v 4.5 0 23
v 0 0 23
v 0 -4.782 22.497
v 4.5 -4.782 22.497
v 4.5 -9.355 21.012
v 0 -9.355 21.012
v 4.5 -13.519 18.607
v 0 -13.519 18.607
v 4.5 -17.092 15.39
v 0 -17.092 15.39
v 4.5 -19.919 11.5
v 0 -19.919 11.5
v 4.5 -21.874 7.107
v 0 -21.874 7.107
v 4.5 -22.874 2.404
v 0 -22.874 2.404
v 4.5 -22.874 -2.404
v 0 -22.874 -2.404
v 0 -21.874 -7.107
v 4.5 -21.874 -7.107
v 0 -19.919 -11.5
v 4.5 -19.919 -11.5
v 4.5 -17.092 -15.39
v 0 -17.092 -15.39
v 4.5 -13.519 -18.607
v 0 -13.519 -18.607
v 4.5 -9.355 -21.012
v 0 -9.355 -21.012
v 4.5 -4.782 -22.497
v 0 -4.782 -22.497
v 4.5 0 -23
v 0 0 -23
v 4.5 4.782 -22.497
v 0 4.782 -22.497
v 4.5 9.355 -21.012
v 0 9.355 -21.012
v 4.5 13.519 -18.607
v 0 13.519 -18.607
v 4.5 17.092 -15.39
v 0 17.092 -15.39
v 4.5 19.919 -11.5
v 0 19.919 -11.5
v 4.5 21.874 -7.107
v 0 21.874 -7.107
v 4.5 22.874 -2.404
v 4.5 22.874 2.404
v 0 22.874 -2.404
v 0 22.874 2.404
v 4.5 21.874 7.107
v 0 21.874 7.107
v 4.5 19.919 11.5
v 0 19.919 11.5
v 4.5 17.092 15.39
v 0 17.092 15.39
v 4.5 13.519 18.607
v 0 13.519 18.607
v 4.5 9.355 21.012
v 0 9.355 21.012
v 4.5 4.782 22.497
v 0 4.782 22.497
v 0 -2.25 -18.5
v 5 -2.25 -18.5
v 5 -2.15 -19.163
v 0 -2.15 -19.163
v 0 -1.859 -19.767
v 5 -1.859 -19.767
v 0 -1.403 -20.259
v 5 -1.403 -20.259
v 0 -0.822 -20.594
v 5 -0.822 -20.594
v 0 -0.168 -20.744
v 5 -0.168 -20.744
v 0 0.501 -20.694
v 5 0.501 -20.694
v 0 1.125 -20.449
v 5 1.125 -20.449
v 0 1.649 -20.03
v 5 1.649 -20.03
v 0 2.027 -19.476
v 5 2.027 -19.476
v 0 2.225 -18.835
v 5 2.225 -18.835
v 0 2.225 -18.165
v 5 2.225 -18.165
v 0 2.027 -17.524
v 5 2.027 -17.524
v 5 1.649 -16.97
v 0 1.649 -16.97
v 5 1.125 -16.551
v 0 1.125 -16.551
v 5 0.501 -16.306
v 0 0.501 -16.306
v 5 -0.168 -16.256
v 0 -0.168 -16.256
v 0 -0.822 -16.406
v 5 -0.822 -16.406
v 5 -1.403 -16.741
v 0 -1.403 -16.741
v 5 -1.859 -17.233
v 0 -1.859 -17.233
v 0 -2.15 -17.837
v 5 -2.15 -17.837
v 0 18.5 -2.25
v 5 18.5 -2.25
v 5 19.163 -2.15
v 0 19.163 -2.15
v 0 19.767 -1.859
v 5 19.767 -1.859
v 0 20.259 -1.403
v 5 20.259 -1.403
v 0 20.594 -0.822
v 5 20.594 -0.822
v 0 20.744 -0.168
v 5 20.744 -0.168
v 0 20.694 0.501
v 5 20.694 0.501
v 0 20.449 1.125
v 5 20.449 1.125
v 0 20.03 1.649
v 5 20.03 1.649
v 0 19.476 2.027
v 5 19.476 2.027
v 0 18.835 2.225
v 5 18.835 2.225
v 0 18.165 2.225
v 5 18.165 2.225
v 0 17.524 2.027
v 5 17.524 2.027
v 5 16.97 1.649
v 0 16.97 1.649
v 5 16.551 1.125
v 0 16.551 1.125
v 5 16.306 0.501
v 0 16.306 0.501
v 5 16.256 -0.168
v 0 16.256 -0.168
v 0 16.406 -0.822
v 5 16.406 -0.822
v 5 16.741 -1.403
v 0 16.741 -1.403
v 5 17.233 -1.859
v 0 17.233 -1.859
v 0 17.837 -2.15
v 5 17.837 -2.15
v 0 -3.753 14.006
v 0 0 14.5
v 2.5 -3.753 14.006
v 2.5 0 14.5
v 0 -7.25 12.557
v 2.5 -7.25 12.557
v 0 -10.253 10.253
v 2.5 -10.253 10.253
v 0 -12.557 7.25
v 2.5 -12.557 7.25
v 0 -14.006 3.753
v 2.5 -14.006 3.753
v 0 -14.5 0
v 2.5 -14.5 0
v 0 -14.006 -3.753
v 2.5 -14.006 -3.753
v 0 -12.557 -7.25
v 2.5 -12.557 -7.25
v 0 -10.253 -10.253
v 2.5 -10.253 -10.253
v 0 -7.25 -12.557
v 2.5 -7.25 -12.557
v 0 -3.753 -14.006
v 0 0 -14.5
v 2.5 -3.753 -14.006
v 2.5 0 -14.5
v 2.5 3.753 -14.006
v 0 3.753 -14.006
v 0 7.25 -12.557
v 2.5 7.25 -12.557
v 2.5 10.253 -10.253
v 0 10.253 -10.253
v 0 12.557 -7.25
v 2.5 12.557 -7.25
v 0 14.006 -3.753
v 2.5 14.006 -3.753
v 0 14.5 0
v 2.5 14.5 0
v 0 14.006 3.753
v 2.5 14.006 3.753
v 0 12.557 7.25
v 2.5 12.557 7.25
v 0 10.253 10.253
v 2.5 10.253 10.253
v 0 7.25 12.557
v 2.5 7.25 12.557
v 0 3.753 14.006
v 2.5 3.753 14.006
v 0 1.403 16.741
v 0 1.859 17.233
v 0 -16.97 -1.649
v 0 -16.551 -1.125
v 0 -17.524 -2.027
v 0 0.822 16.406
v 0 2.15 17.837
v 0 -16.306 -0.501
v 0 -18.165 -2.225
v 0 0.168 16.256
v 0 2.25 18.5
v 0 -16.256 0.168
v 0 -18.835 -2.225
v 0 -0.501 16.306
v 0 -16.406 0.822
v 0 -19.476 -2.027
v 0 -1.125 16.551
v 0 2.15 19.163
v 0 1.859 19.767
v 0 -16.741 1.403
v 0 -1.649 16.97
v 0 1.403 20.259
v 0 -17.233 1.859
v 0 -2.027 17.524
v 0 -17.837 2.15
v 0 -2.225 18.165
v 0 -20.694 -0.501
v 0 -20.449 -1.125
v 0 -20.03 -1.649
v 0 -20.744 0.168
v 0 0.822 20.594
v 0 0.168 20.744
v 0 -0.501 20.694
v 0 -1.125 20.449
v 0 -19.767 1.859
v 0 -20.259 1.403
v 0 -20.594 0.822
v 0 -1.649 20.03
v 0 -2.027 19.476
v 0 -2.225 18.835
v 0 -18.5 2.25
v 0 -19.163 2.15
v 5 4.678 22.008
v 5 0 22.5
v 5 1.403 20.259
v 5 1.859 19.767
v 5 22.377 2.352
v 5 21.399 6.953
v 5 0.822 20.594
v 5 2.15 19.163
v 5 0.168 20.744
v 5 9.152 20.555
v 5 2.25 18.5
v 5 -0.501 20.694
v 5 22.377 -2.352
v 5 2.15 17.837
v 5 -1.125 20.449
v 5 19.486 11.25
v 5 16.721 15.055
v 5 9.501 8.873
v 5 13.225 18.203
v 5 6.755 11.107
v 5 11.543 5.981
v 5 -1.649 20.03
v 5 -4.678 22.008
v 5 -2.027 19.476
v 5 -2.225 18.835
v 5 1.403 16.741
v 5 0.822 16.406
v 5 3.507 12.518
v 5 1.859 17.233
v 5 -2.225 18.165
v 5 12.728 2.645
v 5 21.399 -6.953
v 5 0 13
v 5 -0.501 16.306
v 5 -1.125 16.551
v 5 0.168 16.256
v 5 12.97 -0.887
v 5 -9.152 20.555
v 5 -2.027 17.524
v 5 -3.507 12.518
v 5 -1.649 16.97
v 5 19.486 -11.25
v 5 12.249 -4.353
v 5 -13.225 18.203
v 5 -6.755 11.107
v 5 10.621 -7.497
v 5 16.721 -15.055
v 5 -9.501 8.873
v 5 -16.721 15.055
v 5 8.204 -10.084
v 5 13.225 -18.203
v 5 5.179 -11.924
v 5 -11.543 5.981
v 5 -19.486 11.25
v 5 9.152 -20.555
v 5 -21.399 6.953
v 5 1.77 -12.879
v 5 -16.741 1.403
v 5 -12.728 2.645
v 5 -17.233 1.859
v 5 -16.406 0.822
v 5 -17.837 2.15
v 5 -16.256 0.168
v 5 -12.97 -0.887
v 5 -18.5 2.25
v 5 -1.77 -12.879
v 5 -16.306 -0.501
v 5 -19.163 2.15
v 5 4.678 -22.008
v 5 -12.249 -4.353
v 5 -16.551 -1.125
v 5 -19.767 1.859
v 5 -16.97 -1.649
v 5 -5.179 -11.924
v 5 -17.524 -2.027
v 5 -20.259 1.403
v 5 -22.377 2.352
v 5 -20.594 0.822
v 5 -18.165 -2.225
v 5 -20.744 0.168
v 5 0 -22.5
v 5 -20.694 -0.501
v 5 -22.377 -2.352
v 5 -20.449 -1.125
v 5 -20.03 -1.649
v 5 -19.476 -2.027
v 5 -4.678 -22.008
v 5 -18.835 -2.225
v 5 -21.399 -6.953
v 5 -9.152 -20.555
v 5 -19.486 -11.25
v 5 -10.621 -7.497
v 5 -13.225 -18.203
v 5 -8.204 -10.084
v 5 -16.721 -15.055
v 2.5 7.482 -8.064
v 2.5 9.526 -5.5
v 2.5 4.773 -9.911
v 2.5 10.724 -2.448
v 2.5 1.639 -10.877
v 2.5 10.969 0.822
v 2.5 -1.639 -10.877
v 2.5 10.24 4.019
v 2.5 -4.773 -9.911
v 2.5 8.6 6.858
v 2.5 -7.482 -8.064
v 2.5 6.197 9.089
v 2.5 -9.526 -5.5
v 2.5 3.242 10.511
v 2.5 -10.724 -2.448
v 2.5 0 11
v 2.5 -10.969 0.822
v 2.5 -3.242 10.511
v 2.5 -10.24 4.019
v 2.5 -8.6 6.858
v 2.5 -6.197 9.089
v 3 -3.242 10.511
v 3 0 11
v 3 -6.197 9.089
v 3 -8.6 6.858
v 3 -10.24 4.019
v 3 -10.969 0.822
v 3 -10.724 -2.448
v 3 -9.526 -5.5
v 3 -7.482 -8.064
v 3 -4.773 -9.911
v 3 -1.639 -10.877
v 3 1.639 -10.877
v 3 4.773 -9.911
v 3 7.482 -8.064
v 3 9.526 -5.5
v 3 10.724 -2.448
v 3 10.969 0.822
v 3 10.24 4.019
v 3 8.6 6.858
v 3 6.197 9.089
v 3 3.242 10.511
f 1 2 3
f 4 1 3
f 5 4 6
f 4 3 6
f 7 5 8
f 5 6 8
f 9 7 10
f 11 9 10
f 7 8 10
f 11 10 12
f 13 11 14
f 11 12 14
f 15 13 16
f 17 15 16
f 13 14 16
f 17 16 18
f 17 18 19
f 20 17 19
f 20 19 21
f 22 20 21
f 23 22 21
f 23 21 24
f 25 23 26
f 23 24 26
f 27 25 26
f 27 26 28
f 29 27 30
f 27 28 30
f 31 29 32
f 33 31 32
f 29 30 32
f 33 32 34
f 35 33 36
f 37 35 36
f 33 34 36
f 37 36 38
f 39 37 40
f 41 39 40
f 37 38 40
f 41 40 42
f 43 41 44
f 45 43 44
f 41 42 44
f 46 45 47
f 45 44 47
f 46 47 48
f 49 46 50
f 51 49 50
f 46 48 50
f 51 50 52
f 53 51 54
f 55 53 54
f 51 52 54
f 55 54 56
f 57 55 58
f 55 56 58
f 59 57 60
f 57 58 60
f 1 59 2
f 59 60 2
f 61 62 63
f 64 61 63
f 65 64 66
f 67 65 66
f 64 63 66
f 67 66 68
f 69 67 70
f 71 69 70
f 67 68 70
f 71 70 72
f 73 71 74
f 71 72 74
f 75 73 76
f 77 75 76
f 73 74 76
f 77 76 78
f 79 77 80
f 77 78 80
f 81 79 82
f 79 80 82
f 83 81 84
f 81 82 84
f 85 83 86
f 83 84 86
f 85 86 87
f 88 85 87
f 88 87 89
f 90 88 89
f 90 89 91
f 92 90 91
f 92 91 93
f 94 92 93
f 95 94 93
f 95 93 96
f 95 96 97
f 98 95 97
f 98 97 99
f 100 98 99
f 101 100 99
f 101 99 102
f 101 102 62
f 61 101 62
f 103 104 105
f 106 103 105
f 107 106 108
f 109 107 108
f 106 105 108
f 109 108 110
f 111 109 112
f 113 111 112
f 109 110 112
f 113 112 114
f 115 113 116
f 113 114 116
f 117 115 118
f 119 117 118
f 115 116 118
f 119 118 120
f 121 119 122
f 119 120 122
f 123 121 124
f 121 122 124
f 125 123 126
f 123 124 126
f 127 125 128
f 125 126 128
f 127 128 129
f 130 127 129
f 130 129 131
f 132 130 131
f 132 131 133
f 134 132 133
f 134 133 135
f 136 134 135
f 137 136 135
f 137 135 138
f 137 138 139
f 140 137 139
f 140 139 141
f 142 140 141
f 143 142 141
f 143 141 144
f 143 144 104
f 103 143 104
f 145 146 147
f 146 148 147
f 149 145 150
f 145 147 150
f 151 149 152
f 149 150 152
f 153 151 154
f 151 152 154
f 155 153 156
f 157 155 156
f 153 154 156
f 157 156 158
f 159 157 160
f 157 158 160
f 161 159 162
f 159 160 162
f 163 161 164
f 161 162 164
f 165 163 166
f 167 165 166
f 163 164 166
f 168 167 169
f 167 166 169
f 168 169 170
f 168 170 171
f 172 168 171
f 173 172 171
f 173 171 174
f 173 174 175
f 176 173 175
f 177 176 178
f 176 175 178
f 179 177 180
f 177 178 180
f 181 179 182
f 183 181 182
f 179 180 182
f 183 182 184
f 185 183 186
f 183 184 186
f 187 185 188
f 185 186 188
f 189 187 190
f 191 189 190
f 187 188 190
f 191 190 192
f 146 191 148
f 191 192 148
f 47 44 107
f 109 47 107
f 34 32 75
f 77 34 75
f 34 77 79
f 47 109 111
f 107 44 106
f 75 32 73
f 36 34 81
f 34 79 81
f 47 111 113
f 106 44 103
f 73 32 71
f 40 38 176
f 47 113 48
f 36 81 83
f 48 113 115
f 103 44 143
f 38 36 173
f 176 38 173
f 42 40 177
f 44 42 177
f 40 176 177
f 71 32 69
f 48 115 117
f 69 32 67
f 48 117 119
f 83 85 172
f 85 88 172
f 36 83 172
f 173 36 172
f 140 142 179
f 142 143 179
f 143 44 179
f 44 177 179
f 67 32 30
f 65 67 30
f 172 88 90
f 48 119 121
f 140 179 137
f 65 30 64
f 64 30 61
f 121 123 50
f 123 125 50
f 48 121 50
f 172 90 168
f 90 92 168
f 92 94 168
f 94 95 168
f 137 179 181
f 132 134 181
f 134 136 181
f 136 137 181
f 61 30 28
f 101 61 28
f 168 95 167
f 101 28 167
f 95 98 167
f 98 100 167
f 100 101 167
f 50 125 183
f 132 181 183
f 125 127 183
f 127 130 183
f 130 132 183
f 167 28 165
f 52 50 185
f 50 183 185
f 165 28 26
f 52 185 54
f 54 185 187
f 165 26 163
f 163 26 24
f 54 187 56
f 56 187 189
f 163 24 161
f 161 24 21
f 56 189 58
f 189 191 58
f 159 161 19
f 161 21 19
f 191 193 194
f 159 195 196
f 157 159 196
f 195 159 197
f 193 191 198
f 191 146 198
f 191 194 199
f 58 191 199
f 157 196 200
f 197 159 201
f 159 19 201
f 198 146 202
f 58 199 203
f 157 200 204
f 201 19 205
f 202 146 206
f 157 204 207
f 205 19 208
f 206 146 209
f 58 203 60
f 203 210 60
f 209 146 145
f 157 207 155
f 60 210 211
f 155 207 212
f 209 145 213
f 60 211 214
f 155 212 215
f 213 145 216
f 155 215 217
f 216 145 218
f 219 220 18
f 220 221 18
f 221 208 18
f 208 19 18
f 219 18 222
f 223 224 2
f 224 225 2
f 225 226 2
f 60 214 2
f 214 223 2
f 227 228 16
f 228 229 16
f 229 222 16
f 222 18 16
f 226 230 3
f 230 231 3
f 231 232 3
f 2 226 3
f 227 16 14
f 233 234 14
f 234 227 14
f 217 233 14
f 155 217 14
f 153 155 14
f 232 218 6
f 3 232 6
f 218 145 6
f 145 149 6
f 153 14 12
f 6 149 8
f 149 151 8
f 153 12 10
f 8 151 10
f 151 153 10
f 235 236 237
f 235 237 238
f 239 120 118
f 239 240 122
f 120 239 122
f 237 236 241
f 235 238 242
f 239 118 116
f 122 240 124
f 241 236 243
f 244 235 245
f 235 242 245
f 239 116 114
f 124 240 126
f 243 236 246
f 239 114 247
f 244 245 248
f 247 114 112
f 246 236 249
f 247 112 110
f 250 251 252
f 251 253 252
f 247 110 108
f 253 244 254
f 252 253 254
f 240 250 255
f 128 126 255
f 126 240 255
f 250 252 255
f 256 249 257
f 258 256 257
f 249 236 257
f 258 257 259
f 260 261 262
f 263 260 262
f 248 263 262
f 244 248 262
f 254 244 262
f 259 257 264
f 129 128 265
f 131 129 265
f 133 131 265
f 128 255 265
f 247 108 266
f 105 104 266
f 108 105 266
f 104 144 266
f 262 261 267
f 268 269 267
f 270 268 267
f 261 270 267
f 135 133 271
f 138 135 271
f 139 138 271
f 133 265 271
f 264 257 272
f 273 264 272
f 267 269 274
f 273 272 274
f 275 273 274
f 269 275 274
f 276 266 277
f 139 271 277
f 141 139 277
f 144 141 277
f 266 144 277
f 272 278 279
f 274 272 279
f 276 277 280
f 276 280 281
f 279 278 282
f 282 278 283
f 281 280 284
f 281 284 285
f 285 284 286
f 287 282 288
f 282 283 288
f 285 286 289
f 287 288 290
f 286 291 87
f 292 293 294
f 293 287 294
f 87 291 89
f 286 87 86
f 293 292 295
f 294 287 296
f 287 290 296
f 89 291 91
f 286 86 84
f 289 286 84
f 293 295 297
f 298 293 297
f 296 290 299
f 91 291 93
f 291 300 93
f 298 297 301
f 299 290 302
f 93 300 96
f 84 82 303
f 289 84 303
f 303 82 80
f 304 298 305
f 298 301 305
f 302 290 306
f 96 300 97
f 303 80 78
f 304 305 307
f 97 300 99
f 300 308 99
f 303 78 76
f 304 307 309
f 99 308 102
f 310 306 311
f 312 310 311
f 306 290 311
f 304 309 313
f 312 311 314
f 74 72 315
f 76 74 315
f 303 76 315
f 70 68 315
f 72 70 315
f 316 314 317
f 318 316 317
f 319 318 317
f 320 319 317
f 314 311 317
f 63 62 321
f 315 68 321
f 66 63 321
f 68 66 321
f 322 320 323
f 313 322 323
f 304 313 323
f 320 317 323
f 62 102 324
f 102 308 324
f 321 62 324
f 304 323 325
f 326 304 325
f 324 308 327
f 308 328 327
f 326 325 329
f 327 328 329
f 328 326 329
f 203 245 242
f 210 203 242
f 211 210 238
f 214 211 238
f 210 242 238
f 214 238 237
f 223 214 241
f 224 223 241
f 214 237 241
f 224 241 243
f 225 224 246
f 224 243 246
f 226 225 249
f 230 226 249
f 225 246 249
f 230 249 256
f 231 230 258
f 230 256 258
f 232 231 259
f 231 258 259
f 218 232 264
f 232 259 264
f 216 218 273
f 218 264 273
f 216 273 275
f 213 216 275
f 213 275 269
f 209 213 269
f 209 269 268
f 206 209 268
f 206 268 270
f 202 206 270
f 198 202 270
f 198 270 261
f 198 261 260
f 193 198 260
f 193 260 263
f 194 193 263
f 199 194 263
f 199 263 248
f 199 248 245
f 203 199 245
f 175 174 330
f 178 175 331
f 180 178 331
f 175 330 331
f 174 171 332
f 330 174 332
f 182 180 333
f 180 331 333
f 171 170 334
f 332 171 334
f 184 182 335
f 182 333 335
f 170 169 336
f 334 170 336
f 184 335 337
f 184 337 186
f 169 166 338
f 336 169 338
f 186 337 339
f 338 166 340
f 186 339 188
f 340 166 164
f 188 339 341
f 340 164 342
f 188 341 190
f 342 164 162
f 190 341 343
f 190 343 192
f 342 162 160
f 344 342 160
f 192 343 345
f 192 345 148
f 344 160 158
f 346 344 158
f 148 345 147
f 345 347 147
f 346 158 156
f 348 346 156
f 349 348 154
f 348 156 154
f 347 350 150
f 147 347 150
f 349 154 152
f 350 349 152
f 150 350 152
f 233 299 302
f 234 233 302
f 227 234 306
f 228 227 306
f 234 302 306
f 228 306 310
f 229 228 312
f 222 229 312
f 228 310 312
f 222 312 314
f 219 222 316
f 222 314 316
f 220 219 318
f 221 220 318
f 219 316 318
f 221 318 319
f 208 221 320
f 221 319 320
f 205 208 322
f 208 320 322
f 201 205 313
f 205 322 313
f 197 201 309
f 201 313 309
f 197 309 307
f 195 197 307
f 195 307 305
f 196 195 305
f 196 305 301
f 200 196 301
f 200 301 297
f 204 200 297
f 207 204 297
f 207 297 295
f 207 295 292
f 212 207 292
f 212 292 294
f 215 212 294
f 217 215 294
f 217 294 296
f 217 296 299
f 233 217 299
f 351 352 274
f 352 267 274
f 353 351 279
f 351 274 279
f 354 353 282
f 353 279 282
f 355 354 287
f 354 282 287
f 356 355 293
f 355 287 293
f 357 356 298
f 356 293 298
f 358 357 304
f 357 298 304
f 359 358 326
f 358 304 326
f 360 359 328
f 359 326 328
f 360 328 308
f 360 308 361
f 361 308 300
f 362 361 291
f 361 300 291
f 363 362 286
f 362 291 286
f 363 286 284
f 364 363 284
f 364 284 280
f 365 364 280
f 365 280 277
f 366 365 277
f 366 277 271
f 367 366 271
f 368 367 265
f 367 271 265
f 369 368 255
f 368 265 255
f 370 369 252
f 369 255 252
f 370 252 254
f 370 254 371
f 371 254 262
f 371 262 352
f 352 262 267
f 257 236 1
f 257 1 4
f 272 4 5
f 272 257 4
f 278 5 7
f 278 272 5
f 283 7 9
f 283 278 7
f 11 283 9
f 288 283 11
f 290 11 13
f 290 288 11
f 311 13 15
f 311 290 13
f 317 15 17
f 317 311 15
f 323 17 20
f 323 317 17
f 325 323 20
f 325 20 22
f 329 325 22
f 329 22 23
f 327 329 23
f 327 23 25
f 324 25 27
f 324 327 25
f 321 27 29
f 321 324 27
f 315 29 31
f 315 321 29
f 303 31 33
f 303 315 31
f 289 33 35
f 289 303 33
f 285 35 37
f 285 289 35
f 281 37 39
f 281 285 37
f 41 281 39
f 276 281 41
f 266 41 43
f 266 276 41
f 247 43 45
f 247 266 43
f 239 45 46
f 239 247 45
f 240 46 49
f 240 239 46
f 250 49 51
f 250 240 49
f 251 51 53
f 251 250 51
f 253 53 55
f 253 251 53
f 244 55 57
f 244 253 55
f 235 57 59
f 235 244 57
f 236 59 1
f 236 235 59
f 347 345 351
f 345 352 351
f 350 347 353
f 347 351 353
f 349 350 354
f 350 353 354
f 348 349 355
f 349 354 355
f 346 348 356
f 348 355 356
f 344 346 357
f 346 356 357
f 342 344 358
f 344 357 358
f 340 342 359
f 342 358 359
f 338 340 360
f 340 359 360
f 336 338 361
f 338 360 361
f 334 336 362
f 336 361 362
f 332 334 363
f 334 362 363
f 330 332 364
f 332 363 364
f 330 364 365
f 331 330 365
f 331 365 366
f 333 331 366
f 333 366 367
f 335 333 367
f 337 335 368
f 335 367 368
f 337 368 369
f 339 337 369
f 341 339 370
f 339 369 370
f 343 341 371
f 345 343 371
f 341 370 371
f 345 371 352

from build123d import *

# Parameters (mm, degrees)
SKETCH_2_R               = 2.25
CUT_EXTRUDE_1_DEPTH      = 33.908965344
PATTERN_CIRCULAR_1_COUNT = 4
CHAMFER_1_SIZE           = 0.5


with BuildPart() as part:
    # Эскиз1 → Повернуть1 (revolve)
    with BuildSketch(Plane.XY, mode=Mode.PRIVATE) as revolve_1_sk:
        Polygon((0, 23), (0, 14.5), (2.5, 14.5), (2.5, 11), (3, 11), (5, 13), (5, 23), align=None)
    revolve(revolve_1_sk.sketch.rotate(Axis((0, 0, 0), (1, 0, 0)), 90), axis=Axis((0, 0, 0), (1, 0, 0)))

    # Эскиз2 → Вырез-Вытянуть1 (cut, through all)
    with BuildSketch(Plane(origin=(5, 0, 0), x_dir=(0, 0, -1), z_dir=(1, 0, 0))):
        with Locations((0, 18.5)):
            Circle(SKETCH_2_R)
    cut_extrude_1 = extrude(amount=-CUT_EXTRUDE_1_DEPTH, mode=Mode.SUBTRACT)

    # Круговой массив1: Вырез-Вытянуть1 ×4 about axis
    pattern_circular_1_axis = Axis((0, 0, 0), (1, 0, 0))
    for i in range(1, PATTERN_CIRCULAR_1_COUNT):
        add(cut_extrude_1.rotate(pattern_circular_1_axis, i * 360 / PATTERN_CIRCULAR_1_COUNT), mode=Mode.SUBTRACT)

    # Фаска1
    chamfer_1_edges = [part.edges().sort_by_distance(p)[0] for p in [
        (5, 0, -23),
    ]]
    chamfer(chamfer_1_edges, length=CHAMFER_1_SIZE)


solid = part.part
